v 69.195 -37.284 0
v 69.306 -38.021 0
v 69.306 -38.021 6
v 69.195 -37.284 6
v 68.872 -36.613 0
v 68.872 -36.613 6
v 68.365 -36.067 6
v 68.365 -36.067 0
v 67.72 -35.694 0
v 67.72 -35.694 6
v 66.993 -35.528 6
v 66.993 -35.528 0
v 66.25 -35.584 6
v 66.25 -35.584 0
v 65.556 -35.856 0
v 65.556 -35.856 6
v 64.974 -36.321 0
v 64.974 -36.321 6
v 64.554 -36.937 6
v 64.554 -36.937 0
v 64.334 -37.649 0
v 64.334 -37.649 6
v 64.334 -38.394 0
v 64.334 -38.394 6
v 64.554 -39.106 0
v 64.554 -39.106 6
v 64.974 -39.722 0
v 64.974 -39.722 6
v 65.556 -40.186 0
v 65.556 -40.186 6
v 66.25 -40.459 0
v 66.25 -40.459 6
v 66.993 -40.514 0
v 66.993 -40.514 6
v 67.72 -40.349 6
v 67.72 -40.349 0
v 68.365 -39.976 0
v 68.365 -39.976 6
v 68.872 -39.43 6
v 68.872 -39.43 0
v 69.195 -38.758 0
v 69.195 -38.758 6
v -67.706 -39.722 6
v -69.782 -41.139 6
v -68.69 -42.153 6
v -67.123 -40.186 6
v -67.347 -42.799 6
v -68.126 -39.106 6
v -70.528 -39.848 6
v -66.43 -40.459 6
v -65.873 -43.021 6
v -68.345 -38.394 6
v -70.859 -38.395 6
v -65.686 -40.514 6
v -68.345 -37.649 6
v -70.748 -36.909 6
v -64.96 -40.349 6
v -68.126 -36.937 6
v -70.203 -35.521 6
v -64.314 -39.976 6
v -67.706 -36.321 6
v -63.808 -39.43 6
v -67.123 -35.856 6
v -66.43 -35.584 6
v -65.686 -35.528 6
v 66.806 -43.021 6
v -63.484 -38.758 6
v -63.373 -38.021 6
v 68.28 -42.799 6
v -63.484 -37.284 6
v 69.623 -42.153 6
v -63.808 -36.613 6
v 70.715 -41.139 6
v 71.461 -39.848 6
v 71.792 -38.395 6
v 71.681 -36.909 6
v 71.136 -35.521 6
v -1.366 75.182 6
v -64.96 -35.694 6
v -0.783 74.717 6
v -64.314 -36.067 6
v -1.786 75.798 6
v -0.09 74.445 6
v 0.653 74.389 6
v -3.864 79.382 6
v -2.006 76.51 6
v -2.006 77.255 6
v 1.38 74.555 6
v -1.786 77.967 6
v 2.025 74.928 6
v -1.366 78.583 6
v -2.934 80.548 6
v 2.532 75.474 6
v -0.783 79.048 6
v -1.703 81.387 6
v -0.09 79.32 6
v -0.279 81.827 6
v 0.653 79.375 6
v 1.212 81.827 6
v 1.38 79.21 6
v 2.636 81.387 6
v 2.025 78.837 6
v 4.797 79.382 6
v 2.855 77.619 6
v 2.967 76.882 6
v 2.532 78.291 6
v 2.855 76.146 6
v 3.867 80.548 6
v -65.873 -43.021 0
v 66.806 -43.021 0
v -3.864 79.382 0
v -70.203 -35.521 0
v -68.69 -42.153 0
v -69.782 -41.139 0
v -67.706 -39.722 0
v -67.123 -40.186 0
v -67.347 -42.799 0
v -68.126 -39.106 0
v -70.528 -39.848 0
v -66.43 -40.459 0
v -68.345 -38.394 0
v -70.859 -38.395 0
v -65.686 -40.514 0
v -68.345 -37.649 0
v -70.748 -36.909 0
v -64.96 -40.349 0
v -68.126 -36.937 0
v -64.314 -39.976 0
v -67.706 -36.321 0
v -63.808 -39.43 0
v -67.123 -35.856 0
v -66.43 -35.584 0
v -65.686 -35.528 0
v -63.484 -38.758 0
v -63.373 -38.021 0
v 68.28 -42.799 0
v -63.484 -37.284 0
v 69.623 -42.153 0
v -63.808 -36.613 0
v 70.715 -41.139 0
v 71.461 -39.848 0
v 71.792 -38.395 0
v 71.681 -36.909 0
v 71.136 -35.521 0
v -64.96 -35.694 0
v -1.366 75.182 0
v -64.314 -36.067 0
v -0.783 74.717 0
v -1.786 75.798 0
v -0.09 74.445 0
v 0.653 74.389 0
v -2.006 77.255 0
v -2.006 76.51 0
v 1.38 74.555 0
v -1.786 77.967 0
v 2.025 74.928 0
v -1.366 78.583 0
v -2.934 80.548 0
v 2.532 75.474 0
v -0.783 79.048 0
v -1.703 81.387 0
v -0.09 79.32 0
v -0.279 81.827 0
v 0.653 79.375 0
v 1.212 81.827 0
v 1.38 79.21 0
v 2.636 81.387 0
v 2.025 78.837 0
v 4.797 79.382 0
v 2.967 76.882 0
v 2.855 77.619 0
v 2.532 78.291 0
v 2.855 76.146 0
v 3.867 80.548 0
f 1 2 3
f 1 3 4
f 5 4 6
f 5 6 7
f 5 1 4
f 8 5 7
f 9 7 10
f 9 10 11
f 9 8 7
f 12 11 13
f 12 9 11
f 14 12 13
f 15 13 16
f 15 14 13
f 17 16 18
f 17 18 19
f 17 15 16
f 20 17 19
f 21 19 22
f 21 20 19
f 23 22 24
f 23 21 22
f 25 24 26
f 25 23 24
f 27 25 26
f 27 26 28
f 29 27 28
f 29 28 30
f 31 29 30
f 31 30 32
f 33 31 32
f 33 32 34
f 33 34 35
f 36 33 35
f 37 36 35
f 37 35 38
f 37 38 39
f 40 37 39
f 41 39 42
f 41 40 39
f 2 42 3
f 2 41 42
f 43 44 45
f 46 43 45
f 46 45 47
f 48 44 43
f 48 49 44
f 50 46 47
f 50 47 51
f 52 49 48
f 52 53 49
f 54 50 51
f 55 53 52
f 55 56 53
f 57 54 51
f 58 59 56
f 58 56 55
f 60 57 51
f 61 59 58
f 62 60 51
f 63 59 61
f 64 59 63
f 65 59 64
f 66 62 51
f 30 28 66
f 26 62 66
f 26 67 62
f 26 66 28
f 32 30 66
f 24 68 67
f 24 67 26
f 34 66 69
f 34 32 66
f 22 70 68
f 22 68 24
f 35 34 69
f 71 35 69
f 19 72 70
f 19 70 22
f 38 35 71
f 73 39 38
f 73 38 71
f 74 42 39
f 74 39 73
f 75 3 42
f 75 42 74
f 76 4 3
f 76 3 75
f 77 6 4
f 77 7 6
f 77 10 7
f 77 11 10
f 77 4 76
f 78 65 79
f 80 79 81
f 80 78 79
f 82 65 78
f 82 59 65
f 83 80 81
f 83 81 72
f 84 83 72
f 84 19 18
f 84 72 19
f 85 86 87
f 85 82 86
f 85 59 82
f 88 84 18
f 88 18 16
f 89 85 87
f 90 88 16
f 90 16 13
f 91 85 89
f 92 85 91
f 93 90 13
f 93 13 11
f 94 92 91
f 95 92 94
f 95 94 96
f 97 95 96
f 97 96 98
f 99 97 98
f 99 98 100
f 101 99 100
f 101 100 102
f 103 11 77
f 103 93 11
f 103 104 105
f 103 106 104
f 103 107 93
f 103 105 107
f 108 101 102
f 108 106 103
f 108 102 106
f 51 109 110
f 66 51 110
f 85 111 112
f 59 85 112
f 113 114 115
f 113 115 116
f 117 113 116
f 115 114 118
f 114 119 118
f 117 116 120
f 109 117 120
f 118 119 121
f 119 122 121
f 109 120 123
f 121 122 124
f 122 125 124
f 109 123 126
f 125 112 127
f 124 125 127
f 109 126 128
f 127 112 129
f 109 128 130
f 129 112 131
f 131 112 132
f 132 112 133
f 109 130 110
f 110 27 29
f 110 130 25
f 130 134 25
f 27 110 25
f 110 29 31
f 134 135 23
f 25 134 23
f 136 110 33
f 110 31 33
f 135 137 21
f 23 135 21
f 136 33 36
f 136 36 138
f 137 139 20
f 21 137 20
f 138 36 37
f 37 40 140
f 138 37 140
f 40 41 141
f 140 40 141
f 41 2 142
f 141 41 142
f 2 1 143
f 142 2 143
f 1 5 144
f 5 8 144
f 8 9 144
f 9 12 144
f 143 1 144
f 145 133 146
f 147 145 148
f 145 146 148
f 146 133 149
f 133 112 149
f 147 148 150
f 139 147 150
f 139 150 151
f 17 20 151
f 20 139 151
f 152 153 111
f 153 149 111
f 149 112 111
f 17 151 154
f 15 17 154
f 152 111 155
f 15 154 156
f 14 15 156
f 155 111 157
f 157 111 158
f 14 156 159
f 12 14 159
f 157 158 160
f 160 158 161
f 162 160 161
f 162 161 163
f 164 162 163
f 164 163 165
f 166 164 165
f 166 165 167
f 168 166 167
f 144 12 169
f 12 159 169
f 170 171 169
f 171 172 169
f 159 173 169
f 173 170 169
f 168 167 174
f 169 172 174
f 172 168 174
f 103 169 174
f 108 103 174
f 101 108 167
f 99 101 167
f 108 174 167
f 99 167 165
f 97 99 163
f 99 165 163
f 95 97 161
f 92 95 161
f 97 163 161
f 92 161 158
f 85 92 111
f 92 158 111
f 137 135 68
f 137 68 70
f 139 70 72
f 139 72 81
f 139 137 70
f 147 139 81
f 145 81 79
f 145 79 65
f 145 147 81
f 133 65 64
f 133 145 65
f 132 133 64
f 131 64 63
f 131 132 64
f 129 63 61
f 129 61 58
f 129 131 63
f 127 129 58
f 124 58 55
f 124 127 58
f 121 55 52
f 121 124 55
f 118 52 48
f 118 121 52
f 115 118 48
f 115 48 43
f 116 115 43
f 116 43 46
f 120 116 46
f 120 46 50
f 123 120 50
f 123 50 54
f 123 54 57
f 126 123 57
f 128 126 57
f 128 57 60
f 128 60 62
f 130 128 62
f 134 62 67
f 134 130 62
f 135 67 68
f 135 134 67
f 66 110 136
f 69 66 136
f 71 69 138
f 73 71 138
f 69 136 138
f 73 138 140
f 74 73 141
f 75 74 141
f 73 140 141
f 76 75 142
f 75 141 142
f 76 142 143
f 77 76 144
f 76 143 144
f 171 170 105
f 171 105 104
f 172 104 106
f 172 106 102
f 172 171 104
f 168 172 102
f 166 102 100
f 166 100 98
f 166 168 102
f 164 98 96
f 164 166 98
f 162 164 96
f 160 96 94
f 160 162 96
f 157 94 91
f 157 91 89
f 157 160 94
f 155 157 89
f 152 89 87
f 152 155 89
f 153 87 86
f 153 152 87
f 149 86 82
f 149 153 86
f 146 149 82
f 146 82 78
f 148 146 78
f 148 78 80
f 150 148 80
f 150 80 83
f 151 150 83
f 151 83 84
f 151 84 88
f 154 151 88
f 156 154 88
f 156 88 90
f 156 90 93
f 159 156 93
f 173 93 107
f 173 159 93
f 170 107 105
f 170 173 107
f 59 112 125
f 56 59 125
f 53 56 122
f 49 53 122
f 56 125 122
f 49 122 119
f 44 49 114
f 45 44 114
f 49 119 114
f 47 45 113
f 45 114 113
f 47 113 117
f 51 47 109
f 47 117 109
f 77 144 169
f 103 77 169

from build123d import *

# Parameters (mm, degrees)
F0_R     = 2.5
F1_DEPTH = 6


with BuildPart() as f1:
    # F0 (on Top) → F1 (new body)
    with BuildSketch(Plane.XY):
        with BuildLine():
            ThreePointArc((4.796656, 79.382457), (0.466529, 81.882457), (-3.863598, 79.382457))
            Line((-3.863598, 79.382457), (-70.203344, -35.521353))
            ThreePointArc((-70.203344, -35.521353), (-70.203344, -40.521353), (-65.873217, -43.021353))
            Line((-65.873217, -43.021353), (66.806275, -43.021353))
            ThreePointArc((66.806275, -43.021353), (71.136402, -40.521353), (71.136402, -35.521353))
            Line((71.136402, -35.521353), (4.796656, 79.382457))
        make_face()
        with Locations((-65.873217, -38.021353)):
            Circle(F0_R, mode=Mode.SUBTRACT)
        with Locations((66.806275, -38.021353)):
            Circle(F0_R, mode=Mode.SUBTRACT)
        with Locations((0.466529, 76.882457)):
            Circle(F0_R, mode=Mode.SUBTRACT)
    extrude(amount=F1_DEPTH)


solid = f1.part
